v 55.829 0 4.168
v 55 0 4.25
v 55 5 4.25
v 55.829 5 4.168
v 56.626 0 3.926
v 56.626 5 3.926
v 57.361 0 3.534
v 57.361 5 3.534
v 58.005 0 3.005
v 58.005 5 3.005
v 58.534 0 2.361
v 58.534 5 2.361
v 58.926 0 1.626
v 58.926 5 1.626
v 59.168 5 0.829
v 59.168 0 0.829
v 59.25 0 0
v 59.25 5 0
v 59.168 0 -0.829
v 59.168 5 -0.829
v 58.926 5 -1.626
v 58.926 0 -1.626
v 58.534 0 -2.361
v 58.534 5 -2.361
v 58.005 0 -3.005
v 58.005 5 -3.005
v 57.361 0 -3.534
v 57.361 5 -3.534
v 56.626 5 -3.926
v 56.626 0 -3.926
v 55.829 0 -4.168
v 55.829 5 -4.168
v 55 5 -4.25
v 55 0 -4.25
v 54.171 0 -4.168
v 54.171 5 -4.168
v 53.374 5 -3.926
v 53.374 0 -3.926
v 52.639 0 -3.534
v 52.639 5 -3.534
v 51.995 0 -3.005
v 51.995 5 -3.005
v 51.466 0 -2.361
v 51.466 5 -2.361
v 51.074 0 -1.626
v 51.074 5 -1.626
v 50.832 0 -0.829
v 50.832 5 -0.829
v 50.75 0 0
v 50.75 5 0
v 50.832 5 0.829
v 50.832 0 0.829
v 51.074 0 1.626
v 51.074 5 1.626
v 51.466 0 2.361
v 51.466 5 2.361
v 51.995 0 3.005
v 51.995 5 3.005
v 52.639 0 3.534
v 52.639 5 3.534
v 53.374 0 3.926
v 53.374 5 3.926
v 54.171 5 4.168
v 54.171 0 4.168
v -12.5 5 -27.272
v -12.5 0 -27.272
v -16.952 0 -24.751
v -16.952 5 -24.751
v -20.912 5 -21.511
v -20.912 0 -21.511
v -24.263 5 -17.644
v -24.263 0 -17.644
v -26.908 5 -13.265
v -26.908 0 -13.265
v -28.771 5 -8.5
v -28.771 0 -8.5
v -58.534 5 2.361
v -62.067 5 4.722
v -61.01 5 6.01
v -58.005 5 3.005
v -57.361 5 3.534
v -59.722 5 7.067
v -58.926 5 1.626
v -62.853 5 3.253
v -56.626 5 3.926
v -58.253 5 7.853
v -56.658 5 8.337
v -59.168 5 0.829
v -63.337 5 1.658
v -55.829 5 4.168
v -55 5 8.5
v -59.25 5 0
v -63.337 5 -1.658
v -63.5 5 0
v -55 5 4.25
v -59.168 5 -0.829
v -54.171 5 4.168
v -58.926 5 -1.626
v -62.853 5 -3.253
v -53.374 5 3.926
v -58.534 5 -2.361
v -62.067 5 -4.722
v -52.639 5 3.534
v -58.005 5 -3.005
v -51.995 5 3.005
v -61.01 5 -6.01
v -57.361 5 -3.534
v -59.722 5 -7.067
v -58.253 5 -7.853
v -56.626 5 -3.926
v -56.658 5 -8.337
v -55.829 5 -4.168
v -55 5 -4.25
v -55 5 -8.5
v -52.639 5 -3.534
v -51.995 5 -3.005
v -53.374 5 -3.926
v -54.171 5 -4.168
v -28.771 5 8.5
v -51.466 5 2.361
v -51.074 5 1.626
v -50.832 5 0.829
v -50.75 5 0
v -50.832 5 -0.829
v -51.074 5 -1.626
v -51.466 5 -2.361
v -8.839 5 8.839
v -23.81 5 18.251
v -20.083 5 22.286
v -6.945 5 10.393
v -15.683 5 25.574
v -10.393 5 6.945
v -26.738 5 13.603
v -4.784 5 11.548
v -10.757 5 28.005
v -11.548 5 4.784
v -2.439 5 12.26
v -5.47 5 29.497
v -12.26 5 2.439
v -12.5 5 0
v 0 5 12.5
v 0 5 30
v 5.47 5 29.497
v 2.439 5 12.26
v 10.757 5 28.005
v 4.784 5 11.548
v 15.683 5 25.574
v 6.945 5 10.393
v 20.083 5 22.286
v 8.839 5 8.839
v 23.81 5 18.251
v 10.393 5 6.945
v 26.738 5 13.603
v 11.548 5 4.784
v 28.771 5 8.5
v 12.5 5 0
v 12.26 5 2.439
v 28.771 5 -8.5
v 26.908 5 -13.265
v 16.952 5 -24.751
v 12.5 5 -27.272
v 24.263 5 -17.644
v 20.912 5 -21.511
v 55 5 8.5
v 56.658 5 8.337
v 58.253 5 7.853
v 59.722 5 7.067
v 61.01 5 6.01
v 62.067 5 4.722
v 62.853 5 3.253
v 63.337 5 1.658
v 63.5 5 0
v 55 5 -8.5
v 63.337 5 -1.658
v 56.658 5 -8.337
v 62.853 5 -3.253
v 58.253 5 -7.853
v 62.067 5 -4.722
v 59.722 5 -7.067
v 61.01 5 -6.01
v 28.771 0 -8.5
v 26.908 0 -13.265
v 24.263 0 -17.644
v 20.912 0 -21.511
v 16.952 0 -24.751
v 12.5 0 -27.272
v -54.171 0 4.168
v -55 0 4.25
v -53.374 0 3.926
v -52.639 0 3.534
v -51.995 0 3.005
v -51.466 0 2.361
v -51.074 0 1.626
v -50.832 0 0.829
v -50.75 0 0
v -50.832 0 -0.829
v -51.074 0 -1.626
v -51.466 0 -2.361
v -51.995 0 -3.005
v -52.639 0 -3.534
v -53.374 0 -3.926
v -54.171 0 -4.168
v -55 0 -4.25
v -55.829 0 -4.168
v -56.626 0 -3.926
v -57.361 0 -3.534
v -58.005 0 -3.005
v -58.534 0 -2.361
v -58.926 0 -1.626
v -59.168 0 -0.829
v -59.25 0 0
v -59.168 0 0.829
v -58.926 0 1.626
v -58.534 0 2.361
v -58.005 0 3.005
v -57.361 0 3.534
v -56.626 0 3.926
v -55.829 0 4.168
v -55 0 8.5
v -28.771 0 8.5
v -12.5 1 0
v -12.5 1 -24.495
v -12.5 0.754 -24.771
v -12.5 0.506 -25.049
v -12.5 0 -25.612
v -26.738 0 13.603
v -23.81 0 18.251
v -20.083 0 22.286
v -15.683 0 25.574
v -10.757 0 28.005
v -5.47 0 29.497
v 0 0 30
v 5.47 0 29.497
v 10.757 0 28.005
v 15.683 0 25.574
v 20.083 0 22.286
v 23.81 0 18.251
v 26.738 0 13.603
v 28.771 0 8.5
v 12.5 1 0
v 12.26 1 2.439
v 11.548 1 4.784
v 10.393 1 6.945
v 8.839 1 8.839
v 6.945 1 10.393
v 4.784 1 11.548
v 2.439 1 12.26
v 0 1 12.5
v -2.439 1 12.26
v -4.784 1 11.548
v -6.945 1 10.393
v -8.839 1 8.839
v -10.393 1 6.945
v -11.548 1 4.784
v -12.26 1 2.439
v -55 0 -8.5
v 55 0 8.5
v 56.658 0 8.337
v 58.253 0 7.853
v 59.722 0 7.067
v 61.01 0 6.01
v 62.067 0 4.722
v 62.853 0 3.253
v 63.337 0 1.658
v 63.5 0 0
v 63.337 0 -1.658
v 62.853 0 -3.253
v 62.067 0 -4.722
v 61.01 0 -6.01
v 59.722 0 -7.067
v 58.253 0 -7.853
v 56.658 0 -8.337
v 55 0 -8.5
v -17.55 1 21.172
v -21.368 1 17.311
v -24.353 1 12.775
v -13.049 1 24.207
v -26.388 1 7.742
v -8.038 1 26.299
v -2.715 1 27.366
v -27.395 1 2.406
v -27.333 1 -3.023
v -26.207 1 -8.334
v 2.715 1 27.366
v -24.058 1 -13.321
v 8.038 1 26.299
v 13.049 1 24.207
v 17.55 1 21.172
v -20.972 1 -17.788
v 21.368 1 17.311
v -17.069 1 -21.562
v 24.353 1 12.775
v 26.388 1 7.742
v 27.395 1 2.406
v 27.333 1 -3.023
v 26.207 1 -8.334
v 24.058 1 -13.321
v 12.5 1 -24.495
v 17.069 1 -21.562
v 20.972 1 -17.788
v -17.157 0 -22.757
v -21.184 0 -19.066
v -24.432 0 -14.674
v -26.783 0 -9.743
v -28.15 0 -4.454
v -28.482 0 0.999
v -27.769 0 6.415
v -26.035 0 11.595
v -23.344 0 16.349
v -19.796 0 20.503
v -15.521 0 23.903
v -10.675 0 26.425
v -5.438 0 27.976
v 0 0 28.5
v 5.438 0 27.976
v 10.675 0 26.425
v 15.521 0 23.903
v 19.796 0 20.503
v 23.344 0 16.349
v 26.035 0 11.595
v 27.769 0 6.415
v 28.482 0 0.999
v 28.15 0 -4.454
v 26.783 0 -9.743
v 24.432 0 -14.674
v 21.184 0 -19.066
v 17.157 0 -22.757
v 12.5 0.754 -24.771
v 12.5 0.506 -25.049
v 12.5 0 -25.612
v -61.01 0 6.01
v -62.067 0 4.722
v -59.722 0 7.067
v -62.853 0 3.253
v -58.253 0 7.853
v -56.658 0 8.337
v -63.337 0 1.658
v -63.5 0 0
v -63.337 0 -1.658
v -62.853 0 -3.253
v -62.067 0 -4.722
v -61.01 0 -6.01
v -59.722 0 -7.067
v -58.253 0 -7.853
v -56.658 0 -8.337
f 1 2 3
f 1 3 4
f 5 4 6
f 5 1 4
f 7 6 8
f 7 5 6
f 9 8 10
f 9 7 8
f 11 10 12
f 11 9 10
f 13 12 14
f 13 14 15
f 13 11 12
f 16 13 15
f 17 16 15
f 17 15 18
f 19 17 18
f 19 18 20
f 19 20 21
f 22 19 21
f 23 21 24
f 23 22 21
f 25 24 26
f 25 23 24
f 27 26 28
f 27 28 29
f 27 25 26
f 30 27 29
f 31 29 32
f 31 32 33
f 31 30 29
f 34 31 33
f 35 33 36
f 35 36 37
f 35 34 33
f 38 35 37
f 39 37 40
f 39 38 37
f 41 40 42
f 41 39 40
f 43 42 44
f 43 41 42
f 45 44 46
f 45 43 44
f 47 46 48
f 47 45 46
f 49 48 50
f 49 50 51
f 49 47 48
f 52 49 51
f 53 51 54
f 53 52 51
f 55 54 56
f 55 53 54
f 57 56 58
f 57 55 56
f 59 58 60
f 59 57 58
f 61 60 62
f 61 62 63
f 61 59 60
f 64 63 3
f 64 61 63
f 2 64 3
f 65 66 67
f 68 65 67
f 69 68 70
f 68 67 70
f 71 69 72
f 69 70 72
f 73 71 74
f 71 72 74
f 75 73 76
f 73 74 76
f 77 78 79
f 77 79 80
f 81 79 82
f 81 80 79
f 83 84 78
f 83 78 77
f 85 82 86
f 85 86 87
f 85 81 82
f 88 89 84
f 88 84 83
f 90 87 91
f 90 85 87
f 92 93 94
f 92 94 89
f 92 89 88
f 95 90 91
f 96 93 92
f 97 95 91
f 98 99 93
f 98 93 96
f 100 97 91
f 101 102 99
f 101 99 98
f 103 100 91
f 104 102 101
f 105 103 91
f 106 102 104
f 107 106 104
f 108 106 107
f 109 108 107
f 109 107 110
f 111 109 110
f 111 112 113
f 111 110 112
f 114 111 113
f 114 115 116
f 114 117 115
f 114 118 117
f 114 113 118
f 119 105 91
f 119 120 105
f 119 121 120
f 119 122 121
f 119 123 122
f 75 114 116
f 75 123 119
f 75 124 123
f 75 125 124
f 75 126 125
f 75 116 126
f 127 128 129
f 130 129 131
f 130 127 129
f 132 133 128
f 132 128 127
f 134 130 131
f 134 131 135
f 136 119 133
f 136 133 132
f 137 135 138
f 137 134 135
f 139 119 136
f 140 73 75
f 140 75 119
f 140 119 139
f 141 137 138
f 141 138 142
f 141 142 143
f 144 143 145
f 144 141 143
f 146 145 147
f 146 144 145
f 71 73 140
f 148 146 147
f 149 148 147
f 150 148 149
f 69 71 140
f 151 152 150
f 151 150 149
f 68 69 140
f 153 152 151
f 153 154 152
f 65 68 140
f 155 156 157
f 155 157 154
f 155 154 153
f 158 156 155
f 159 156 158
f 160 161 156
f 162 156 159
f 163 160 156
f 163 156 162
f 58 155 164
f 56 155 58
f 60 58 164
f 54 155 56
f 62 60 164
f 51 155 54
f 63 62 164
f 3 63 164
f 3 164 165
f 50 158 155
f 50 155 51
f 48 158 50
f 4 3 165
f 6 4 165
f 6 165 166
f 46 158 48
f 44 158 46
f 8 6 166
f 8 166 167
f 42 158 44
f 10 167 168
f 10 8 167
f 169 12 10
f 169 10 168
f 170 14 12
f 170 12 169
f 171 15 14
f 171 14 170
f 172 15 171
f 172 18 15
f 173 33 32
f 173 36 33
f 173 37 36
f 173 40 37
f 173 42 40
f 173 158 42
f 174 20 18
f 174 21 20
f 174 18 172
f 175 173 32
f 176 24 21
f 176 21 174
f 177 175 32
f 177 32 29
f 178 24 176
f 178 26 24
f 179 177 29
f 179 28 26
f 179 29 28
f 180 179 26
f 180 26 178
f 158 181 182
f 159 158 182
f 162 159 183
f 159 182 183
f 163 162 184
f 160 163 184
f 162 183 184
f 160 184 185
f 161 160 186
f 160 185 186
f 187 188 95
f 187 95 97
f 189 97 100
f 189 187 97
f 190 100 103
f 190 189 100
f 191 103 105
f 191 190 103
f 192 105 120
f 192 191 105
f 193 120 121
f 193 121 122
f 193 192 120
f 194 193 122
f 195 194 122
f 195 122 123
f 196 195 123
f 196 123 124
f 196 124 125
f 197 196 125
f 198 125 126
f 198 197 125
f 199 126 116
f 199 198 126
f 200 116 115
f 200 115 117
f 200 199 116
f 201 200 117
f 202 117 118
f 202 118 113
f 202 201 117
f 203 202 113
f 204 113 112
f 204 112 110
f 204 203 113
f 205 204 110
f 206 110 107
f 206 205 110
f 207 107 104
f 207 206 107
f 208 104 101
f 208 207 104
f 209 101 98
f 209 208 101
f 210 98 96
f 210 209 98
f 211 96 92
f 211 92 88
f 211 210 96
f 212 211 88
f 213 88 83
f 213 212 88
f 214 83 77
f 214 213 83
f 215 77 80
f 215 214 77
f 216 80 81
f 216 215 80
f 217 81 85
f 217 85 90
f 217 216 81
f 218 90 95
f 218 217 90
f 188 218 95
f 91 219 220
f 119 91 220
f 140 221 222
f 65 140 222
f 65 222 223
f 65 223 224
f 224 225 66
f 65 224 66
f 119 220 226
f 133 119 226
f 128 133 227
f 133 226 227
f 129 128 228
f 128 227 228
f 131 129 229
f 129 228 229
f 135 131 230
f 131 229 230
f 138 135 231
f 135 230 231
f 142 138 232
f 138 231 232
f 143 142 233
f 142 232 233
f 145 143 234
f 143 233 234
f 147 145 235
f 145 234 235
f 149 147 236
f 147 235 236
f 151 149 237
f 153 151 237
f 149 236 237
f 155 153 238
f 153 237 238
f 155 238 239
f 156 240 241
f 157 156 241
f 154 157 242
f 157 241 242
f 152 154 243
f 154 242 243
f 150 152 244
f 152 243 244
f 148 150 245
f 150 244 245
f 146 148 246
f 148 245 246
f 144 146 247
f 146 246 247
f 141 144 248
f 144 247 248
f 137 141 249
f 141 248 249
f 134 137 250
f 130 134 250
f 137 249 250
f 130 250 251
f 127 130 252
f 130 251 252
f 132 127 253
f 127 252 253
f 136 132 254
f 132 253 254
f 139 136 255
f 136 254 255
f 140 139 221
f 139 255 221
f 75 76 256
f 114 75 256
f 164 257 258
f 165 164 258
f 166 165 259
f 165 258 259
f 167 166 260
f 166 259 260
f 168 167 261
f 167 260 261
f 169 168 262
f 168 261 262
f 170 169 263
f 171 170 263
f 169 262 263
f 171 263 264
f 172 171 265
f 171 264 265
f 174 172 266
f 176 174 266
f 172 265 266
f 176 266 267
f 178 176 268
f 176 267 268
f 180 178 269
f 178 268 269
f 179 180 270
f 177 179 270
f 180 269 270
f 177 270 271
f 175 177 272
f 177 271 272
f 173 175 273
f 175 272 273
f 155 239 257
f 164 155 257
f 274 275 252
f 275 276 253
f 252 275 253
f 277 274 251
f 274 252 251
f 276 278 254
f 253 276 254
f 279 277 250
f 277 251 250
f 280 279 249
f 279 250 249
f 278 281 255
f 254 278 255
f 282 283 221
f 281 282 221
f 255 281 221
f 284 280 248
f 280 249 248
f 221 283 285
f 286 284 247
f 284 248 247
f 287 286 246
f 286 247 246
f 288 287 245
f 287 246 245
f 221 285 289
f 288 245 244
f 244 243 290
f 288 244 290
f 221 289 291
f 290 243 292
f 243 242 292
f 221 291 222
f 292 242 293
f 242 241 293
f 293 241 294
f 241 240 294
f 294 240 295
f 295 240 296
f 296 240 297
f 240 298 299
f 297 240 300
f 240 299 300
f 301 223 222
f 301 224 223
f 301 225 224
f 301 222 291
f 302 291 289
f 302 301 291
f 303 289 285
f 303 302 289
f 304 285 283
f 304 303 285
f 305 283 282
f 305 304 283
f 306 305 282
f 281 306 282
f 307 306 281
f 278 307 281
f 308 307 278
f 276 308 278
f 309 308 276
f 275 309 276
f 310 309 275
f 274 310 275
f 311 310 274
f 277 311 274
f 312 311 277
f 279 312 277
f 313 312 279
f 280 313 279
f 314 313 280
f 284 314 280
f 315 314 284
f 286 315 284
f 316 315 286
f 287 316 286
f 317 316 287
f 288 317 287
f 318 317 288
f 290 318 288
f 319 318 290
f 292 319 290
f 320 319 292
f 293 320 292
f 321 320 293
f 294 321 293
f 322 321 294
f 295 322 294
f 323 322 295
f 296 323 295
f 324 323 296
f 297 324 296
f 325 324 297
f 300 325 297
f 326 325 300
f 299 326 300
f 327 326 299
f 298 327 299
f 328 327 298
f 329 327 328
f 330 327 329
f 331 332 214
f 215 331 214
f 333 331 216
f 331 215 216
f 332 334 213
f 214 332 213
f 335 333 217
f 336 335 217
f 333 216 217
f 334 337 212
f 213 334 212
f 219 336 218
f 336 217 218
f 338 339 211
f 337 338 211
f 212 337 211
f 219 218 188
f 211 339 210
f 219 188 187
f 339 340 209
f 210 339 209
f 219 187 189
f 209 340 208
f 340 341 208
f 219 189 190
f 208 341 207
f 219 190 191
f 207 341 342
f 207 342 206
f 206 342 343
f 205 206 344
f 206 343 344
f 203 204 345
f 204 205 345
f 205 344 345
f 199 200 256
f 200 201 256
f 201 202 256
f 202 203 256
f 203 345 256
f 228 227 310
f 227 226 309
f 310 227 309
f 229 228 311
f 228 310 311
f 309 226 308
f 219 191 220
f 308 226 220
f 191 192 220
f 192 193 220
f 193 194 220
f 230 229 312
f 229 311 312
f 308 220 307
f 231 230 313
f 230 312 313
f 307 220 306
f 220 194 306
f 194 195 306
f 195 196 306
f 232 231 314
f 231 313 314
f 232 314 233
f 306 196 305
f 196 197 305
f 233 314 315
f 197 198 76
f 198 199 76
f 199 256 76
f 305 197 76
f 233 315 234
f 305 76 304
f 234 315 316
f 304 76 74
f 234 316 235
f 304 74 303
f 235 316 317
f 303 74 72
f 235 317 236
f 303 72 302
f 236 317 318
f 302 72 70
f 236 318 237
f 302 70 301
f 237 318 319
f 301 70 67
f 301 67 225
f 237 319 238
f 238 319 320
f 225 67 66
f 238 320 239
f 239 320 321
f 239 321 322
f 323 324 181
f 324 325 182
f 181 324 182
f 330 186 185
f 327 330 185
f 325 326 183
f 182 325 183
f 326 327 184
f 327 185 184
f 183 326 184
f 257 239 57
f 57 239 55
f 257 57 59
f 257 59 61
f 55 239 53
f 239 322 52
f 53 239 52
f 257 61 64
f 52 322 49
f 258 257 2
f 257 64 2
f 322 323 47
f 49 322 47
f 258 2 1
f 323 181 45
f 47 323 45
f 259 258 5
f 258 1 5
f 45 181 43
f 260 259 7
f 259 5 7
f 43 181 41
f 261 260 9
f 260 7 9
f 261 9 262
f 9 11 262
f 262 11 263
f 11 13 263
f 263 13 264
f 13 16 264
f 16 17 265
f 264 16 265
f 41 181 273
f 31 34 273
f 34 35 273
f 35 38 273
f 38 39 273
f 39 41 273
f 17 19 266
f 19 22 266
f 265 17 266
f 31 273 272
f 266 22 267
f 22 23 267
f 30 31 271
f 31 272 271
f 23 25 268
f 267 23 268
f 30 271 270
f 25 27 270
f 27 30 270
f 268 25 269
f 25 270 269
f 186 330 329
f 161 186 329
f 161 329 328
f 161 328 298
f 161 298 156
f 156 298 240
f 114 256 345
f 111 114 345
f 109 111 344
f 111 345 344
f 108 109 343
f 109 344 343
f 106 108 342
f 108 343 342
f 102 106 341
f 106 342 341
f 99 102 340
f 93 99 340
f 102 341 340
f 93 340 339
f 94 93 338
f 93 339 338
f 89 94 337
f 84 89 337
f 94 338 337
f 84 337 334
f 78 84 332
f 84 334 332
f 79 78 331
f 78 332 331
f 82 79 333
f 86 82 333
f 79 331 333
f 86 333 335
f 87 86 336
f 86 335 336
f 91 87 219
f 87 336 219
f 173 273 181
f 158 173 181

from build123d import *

# Parameters (mm, degrees)
SKETCH1_R           = 4.25
BOSS_EXTRUDE1_DEPTH = 5
SKETCH2_R           = 27.5
CUT_EXTRUDE1_DEPTH  = 1
CHAMFER1_SIZE       = 1


with BuildPart() as part:
    # Sketch1 → Boss-Extrude1 (new body)
    with BuildSketch(Plane(origin=(0, 0, 0), x_dir=(1, 0, 0), z_dir=(0, 1, 0))):
        with BuildLine():
            Line((55, 8.5), (28.770644762, 8.5))
            ThreePointArc((28.770644762, 8.5), (22.669615426, 19.649135769), (12.5, 27.271780287))
            Line((12.5, 27.271780287), (12.5, 0))
            ThreePointArc((12.5, 0), (0, -12.5), (-12.5, 0))
            Line((-12.5, 0), (-12.5, 27.271780287))
            ThreePointArc((-12.5, 27.271780287), (-22.669615426, 19.649135769), (-28.770644762, 8.5))
            Line((-28.770644762, 8.5), (-55, 8.5))
            ThreePointArc((-55, 8.5), (-63.5, 0), (-55, -8.5))
            Line((-55, -8.5), (-28.770644762, -8.5))
            ThreePointArc((-28.770644762, -8.5), (0, -30), (28.770644762, -8.5))
            Line((28.770644762, -8.5), (55, -8.5))
            ThreePointArc((55, -8.5), (63.5, 0), (55, 8.5))
        make_face()
        with Locations(Location((-55, 0, 0), (0, 0, 270))):
            Circle(SKETCH1_R, mode=Mode.SUBTRACT)
        with Locations(Location((55, 0, 0), (0, 0, 270))):
            Circle(SKETCH1_R, mode=Mode.SUBTRACT)
    extrude(amount=BOSS_EXTRUDE1_DEPTH)

    # Sketch2 → Cut-Extrude1 (cut)
    with BuildSketch(Plane(origin=(0, 0, 0), x_dir=(1, 0, 0), z_dir=(0, 1, 0))):
        Circle(SKETCH2_R)
    extrude(amount=CUT_EXTRUDE1_DEPTH, mode=Mode.SUBTRACT)

    # Chamfer1
    chamfer1_edges = [part.edges().sort_by_distance(p)[0] for p in [
        (0, 0, 27.5),
    ]]
    chamfer(chamfer1_edges, length=CHAMFER1_SIZE - 0.0001)  # a hair under: the kernel refuses the full size


solid = part.part
